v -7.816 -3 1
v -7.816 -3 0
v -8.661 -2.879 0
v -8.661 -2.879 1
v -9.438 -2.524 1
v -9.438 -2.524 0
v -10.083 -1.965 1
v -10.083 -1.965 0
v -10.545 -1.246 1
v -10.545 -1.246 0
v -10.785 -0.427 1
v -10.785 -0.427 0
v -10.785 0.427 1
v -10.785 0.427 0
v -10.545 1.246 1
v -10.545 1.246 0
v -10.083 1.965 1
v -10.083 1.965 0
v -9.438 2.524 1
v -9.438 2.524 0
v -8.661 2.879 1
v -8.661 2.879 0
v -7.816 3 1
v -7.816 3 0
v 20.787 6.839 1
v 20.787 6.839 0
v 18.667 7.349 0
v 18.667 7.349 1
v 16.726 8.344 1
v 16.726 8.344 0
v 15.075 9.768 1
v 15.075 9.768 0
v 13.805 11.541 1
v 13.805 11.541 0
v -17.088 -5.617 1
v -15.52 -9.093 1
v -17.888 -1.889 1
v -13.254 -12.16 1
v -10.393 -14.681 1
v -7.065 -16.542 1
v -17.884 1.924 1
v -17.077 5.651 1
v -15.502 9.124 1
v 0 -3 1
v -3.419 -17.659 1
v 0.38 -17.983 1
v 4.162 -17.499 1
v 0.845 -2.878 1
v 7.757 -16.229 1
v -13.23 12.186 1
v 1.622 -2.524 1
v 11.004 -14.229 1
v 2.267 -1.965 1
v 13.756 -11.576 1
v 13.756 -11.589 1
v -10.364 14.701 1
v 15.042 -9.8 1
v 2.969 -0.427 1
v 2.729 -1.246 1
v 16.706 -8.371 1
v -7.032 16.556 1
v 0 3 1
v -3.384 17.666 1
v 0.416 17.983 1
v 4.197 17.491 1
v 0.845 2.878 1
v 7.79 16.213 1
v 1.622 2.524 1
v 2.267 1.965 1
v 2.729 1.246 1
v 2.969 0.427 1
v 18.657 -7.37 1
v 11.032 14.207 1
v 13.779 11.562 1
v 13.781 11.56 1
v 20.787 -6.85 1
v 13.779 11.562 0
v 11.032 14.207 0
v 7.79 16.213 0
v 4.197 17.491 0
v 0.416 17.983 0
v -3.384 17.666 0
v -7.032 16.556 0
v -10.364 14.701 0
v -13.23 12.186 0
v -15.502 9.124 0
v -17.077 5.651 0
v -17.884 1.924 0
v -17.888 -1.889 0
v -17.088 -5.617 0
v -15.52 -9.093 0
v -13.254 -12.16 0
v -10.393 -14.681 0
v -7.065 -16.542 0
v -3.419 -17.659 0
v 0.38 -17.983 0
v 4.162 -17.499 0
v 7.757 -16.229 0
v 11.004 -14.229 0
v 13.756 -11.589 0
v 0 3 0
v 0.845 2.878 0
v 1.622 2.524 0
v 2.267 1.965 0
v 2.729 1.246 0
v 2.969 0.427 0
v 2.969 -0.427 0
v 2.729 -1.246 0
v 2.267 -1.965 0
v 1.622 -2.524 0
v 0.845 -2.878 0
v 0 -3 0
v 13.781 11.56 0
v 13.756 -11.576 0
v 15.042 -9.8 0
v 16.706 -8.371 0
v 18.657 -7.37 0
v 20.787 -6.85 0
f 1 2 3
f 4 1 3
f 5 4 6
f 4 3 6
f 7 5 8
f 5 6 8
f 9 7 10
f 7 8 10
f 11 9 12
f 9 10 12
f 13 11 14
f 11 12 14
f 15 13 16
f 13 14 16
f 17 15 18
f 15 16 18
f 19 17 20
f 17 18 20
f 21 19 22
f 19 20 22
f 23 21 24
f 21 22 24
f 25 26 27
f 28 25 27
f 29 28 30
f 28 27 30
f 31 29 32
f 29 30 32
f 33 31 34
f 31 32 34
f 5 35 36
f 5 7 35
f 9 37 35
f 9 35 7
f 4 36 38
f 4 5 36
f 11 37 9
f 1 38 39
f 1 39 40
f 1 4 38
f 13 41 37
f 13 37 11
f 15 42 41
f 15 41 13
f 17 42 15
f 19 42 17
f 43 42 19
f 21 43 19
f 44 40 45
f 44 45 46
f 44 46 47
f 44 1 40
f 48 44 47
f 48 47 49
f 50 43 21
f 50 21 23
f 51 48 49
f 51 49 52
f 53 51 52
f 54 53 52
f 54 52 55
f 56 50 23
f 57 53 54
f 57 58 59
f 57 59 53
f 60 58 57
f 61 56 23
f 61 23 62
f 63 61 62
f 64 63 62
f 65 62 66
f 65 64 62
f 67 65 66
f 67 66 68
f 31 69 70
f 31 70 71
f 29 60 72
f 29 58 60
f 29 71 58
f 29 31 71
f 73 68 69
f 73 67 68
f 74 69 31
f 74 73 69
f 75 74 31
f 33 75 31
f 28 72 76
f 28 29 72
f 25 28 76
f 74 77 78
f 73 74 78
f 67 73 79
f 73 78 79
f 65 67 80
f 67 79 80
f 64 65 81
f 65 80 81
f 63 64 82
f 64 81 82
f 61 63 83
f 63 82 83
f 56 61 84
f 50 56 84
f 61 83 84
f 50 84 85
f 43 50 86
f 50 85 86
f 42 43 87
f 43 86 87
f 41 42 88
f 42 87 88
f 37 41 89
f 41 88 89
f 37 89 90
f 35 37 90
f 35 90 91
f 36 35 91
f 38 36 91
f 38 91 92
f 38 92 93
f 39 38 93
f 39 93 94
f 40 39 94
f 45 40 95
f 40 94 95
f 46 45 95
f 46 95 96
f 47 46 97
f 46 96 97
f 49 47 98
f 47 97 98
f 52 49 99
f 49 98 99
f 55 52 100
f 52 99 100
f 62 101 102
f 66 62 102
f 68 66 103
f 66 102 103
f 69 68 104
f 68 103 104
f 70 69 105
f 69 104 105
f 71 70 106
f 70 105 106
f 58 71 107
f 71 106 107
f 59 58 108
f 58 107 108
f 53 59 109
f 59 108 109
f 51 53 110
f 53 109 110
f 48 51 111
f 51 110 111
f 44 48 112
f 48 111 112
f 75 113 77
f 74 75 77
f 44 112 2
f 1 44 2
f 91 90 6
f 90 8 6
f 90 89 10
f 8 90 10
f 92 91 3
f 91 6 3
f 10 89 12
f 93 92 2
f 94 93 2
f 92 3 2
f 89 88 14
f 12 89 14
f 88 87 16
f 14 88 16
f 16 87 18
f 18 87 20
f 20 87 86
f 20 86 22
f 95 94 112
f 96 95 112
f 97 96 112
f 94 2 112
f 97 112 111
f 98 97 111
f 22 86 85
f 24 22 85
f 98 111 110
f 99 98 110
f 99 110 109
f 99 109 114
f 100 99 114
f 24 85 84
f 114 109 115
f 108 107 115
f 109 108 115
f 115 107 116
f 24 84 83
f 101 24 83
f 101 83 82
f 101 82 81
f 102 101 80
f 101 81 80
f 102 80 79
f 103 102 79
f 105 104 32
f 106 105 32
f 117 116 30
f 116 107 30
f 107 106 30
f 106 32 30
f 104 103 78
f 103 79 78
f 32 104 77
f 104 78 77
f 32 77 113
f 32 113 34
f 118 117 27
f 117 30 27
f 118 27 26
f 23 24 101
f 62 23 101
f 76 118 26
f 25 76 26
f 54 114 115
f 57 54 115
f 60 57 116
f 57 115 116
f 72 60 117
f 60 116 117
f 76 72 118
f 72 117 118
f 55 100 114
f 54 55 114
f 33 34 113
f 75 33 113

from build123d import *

# Parameters (mm, degrees)
EXTRUDE_1_DEPTH = 1


with BuildPart() as part:
    # 草图1 → 凸台-拉伸1 (new body)
    with BuildSketch(Plane.XY):
        with BuildLine():
            Line((13.756161337, -11.589316843), (13.755737728, -11.576233912))
            ThreePointArc((13.755737728, -11.576233912), (16.705777817, -8.371391827), (20.787340615, -6.8500127))
            Line((20.787340615, -6.8500127), (20.787340615, 6.838712609))
            ThreePointArc((20.787340615, 6.838712609), (16.726466447, 8.343658429), (13.805099755, 11.540716072))
            Line((13.805099755, 11.540716072), (13.780842765, 11.560323903))
            Line((13.780842765, 11.560323903), (13.779097734, 11.562037241))
            ThreePointArc((13.779097734, 11.562037241), (-17.987329683, 0.017820318), (13.756161337, -11.589316843))
        make_face()
        with BuildLine():
            Line((-7.815615951, 3.00000508), (0, 3.00000508))
            ThreePointArc((0, 3.00000508), (3.000005067, 1.3e-08), (0, -3.000005054))
            Line((0, -3.000005054), (-7.815615951, -3.000005054))
            ThreePointArc((-7.815615951, -3.000005054), (-10.816019825, 1.3e-08), (-7.815615951, 3.00000508))
        make_face(mode=Mode.SUBTRACT)
    extrude(amount=EXTRUDE_1_DEPTH)


solid = part.part
